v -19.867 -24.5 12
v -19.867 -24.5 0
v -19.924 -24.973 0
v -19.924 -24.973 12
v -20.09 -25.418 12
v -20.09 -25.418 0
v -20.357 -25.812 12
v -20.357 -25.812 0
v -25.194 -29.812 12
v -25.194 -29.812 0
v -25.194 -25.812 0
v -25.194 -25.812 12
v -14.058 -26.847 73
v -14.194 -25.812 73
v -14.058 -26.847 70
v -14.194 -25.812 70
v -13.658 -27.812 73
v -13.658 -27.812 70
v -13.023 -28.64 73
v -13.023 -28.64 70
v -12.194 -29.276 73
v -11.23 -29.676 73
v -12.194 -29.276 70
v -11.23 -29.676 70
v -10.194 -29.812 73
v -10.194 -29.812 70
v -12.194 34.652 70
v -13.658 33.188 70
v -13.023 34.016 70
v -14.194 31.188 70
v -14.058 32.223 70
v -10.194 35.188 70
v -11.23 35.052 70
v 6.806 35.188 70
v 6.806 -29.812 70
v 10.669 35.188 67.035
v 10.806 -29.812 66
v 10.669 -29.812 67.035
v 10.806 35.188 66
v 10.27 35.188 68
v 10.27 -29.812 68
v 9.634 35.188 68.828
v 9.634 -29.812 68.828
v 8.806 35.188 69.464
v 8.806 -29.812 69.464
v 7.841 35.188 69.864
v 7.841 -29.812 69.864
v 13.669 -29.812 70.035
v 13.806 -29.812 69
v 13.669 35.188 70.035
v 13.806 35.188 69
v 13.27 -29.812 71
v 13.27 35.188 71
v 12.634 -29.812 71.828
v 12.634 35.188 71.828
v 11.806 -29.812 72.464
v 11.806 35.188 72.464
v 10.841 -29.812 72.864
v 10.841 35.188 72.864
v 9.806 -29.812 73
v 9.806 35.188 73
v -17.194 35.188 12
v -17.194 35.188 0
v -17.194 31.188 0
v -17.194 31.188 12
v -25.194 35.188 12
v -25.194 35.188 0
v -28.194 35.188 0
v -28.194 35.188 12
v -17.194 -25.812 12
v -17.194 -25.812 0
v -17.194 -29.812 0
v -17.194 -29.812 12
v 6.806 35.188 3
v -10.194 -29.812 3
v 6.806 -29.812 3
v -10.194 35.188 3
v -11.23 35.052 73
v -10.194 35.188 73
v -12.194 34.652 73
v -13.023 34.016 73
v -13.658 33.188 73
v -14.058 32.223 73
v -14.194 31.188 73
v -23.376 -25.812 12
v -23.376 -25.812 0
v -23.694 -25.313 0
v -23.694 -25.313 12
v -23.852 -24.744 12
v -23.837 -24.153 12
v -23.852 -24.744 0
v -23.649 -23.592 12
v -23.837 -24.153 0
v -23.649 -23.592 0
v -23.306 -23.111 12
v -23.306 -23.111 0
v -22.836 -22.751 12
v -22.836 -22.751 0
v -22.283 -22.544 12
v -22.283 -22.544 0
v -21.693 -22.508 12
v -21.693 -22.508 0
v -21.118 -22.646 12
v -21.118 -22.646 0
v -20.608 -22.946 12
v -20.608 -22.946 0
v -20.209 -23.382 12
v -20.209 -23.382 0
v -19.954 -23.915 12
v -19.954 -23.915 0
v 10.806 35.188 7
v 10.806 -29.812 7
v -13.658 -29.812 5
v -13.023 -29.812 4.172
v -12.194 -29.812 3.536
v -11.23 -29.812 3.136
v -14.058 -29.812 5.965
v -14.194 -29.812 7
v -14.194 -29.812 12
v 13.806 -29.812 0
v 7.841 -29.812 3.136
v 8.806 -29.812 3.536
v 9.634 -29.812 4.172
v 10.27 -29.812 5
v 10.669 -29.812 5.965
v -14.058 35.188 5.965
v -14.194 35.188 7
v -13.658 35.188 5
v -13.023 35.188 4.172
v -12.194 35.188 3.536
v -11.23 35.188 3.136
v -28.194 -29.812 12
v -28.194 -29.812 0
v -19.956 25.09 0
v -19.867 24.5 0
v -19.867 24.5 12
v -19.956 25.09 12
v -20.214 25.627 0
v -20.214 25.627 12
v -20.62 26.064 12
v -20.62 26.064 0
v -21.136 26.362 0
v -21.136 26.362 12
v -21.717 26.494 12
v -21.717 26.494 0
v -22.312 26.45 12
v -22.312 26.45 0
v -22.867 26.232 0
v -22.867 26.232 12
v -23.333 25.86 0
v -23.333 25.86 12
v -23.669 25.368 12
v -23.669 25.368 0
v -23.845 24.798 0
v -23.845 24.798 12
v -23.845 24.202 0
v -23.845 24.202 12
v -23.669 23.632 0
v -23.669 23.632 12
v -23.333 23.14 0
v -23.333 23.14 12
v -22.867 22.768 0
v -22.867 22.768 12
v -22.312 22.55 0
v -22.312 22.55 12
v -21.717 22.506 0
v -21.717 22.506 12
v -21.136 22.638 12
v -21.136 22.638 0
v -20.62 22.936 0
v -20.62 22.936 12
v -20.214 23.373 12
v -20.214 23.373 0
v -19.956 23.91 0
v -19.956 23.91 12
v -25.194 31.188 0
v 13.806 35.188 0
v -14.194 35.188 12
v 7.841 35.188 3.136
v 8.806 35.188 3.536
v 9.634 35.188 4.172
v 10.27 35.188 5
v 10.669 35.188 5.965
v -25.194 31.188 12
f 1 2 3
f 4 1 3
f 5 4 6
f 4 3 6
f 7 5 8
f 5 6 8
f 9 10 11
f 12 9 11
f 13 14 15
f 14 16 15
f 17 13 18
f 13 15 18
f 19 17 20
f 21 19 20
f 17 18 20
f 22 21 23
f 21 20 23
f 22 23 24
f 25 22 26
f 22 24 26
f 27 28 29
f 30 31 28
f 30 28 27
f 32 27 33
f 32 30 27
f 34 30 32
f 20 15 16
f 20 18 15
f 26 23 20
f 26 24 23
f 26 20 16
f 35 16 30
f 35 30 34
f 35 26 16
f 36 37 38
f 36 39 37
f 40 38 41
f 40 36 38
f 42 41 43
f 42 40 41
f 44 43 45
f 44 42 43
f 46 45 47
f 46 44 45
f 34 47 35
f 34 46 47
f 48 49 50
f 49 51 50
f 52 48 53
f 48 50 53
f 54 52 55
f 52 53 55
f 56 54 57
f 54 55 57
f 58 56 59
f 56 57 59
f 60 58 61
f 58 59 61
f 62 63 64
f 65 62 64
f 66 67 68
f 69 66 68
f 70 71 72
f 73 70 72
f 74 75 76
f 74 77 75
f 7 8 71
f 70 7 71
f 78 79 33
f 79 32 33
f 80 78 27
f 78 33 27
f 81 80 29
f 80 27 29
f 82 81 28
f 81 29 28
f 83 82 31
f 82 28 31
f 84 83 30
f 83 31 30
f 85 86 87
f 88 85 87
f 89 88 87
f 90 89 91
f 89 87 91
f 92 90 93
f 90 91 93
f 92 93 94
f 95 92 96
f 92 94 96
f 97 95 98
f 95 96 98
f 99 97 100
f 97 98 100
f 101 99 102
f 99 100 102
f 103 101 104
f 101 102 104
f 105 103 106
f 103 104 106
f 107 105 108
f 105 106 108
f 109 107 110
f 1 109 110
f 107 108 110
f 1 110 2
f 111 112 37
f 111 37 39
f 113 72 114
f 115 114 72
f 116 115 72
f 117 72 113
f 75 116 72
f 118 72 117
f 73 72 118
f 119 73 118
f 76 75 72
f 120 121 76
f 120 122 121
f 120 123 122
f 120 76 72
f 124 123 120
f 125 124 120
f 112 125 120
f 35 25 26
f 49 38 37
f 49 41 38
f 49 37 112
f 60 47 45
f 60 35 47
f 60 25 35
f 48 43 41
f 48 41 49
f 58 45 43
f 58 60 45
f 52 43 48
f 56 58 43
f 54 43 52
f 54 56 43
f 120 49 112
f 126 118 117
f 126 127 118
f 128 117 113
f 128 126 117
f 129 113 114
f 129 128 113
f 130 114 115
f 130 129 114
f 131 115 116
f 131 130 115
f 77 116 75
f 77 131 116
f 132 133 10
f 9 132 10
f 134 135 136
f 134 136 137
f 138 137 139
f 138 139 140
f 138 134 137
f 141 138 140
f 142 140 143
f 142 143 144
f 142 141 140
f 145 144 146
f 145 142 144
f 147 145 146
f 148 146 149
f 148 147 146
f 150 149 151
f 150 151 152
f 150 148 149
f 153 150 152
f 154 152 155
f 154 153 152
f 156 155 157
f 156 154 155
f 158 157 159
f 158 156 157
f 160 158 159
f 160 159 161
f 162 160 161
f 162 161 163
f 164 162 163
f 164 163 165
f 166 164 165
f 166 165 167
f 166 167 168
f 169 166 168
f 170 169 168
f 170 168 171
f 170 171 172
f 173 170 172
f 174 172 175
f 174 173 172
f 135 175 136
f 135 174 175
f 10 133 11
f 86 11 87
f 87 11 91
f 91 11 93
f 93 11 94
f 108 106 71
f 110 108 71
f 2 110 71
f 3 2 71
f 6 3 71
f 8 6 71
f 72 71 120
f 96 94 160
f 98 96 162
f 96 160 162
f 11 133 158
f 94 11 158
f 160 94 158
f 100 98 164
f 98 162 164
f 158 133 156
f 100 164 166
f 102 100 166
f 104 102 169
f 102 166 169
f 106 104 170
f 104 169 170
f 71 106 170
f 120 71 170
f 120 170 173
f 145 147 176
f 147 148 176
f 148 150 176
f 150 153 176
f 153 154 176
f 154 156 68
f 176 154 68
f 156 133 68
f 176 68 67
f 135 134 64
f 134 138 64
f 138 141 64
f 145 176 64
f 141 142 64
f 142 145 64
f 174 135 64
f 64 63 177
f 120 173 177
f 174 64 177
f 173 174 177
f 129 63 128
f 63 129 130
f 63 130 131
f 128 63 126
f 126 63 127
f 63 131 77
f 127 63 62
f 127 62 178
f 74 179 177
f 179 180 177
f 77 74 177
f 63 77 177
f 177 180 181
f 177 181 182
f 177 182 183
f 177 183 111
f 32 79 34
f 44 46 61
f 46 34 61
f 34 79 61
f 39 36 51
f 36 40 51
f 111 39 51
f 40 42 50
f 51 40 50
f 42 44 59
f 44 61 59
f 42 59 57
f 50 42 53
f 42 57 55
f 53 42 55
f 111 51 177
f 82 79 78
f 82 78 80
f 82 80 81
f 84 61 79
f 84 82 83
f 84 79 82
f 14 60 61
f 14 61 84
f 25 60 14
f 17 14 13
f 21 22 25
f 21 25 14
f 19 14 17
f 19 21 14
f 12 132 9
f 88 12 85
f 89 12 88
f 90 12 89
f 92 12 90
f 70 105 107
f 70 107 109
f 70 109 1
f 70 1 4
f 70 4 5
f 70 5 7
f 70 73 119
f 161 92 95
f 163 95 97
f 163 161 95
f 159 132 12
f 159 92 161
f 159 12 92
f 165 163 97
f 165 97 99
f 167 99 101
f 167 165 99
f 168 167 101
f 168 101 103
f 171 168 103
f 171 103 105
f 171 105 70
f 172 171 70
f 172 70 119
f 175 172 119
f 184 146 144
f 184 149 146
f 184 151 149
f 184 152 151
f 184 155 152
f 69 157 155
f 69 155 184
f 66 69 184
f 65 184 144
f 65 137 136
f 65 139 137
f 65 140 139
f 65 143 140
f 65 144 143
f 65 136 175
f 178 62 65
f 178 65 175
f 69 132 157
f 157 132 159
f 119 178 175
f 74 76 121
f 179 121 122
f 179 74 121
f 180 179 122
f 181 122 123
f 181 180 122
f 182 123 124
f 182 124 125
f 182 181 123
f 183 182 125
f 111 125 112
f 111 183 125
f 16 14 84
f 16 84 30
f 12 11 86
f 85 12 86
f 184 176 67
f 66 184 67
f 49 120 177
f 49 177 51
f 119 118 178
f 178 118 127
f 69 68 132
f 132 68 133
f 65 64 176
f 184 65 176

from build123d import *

# Parameters (mm, degrees)
F0_R     = 2
F1_DEPTH = 12
F0_W     = 25
F0_H     = 65
F2_DEPTH = 3
F0_W_2   = 3
F3_DEPTH = 70
F5_DEPTH = 65
F6_R     = 4


with BuildPart() as f1:
    # F0 (on Top) → F1 (new body)
    with BuildSketch(Plane.XY):
        with BuildLine():
            Line((-25.194335, 35.187962), (-28.194335, 35.187962))
            Line((-28.194335, 35.187962), (-28.194335, -29.812038))
            Line((-28.194335, -29.812038), (-25.194335, -29.812038))
            Line((-25.194335, -29.812038), (-25.194335, -25.812038))
            Line((-25.194335, -25.812038), (-23.376417, -25.812038))
            ThreePointArc((-23.376417, -25.812038), (-22.567294, -22.626637), (-19.866929, -24.5))
            ThreePointArc((-19.866929, -24.5), (-19.993566, -25.200365), (-20.35744, -25.812038))
            Line((-20.35744, -25.812038), (-17.194335, -25.812038))
            Line((-17.194335, -25.812038), (-17.194335, -29.812038))
            Line((-17.194335, -29.812038), (-14.194335, -29.812038))
            Line((-14.194335, -29.812038), (-14.194335, 35.187962))
            Line((-14.194335, 35.187962), (-17.194335, 35.187962))
            Line((-17.194335, 35.187962), (-17.194335, 31.187962))
            Line((-17.194335, 31.187962), (-25.194335, 31.187962))
            Line((-25.194335, 31.187962), (-25.194335, 35.187962))
        make_face()
        with Locations((-21.866929, 24.5)):
            Circle(F0_R, mode=Mode.SUBTRACT)
    extrude(amount=F1_DEPTH)

    # F0 (on Top) → F2 (join)
    with BuildSketch(Plane.XY):
        with Locations((-1.694335, 2.687962)):
            Rectangle(F0_W, F0_H)
    extrude(amount=F2_DEPTH)

    # F0 (on Top) → F3 (join)
    with BuildSketch(Plane.XY):
        with Locations((12.305665, 2.687962)):
            Rectangle(F0_W_2, F0_H)
    extrude(amount=F3_DEPTH)

    # F4 (on face) → F5 (join)
    with BuildSketch(Plane.XZ.offset(29.812038)):
        Polygon((10.805665, 70), (13.805665, 70), (13.805665, 73), (-14.194335, 73), (-14.194335, 70), align=None)
    extrude(amount=-F5_DEPTH)

    # F6
    f6_edges = [f1.edges().sort_by_distance(p)[0] for p in [
        (10.805665, 2.687962, 3),
        (10.805665, 2.687962, 70),
        (-14.194335, 2.687962, 3),
        (13.805665, 2.687962, 73),
        (-14.194335, -29.812038, 71.5),
        (-14.194335, 35.187962, 71.5),
    ]]
    fillet(f6_edges, radius=F6_R)


solid = f1.part
